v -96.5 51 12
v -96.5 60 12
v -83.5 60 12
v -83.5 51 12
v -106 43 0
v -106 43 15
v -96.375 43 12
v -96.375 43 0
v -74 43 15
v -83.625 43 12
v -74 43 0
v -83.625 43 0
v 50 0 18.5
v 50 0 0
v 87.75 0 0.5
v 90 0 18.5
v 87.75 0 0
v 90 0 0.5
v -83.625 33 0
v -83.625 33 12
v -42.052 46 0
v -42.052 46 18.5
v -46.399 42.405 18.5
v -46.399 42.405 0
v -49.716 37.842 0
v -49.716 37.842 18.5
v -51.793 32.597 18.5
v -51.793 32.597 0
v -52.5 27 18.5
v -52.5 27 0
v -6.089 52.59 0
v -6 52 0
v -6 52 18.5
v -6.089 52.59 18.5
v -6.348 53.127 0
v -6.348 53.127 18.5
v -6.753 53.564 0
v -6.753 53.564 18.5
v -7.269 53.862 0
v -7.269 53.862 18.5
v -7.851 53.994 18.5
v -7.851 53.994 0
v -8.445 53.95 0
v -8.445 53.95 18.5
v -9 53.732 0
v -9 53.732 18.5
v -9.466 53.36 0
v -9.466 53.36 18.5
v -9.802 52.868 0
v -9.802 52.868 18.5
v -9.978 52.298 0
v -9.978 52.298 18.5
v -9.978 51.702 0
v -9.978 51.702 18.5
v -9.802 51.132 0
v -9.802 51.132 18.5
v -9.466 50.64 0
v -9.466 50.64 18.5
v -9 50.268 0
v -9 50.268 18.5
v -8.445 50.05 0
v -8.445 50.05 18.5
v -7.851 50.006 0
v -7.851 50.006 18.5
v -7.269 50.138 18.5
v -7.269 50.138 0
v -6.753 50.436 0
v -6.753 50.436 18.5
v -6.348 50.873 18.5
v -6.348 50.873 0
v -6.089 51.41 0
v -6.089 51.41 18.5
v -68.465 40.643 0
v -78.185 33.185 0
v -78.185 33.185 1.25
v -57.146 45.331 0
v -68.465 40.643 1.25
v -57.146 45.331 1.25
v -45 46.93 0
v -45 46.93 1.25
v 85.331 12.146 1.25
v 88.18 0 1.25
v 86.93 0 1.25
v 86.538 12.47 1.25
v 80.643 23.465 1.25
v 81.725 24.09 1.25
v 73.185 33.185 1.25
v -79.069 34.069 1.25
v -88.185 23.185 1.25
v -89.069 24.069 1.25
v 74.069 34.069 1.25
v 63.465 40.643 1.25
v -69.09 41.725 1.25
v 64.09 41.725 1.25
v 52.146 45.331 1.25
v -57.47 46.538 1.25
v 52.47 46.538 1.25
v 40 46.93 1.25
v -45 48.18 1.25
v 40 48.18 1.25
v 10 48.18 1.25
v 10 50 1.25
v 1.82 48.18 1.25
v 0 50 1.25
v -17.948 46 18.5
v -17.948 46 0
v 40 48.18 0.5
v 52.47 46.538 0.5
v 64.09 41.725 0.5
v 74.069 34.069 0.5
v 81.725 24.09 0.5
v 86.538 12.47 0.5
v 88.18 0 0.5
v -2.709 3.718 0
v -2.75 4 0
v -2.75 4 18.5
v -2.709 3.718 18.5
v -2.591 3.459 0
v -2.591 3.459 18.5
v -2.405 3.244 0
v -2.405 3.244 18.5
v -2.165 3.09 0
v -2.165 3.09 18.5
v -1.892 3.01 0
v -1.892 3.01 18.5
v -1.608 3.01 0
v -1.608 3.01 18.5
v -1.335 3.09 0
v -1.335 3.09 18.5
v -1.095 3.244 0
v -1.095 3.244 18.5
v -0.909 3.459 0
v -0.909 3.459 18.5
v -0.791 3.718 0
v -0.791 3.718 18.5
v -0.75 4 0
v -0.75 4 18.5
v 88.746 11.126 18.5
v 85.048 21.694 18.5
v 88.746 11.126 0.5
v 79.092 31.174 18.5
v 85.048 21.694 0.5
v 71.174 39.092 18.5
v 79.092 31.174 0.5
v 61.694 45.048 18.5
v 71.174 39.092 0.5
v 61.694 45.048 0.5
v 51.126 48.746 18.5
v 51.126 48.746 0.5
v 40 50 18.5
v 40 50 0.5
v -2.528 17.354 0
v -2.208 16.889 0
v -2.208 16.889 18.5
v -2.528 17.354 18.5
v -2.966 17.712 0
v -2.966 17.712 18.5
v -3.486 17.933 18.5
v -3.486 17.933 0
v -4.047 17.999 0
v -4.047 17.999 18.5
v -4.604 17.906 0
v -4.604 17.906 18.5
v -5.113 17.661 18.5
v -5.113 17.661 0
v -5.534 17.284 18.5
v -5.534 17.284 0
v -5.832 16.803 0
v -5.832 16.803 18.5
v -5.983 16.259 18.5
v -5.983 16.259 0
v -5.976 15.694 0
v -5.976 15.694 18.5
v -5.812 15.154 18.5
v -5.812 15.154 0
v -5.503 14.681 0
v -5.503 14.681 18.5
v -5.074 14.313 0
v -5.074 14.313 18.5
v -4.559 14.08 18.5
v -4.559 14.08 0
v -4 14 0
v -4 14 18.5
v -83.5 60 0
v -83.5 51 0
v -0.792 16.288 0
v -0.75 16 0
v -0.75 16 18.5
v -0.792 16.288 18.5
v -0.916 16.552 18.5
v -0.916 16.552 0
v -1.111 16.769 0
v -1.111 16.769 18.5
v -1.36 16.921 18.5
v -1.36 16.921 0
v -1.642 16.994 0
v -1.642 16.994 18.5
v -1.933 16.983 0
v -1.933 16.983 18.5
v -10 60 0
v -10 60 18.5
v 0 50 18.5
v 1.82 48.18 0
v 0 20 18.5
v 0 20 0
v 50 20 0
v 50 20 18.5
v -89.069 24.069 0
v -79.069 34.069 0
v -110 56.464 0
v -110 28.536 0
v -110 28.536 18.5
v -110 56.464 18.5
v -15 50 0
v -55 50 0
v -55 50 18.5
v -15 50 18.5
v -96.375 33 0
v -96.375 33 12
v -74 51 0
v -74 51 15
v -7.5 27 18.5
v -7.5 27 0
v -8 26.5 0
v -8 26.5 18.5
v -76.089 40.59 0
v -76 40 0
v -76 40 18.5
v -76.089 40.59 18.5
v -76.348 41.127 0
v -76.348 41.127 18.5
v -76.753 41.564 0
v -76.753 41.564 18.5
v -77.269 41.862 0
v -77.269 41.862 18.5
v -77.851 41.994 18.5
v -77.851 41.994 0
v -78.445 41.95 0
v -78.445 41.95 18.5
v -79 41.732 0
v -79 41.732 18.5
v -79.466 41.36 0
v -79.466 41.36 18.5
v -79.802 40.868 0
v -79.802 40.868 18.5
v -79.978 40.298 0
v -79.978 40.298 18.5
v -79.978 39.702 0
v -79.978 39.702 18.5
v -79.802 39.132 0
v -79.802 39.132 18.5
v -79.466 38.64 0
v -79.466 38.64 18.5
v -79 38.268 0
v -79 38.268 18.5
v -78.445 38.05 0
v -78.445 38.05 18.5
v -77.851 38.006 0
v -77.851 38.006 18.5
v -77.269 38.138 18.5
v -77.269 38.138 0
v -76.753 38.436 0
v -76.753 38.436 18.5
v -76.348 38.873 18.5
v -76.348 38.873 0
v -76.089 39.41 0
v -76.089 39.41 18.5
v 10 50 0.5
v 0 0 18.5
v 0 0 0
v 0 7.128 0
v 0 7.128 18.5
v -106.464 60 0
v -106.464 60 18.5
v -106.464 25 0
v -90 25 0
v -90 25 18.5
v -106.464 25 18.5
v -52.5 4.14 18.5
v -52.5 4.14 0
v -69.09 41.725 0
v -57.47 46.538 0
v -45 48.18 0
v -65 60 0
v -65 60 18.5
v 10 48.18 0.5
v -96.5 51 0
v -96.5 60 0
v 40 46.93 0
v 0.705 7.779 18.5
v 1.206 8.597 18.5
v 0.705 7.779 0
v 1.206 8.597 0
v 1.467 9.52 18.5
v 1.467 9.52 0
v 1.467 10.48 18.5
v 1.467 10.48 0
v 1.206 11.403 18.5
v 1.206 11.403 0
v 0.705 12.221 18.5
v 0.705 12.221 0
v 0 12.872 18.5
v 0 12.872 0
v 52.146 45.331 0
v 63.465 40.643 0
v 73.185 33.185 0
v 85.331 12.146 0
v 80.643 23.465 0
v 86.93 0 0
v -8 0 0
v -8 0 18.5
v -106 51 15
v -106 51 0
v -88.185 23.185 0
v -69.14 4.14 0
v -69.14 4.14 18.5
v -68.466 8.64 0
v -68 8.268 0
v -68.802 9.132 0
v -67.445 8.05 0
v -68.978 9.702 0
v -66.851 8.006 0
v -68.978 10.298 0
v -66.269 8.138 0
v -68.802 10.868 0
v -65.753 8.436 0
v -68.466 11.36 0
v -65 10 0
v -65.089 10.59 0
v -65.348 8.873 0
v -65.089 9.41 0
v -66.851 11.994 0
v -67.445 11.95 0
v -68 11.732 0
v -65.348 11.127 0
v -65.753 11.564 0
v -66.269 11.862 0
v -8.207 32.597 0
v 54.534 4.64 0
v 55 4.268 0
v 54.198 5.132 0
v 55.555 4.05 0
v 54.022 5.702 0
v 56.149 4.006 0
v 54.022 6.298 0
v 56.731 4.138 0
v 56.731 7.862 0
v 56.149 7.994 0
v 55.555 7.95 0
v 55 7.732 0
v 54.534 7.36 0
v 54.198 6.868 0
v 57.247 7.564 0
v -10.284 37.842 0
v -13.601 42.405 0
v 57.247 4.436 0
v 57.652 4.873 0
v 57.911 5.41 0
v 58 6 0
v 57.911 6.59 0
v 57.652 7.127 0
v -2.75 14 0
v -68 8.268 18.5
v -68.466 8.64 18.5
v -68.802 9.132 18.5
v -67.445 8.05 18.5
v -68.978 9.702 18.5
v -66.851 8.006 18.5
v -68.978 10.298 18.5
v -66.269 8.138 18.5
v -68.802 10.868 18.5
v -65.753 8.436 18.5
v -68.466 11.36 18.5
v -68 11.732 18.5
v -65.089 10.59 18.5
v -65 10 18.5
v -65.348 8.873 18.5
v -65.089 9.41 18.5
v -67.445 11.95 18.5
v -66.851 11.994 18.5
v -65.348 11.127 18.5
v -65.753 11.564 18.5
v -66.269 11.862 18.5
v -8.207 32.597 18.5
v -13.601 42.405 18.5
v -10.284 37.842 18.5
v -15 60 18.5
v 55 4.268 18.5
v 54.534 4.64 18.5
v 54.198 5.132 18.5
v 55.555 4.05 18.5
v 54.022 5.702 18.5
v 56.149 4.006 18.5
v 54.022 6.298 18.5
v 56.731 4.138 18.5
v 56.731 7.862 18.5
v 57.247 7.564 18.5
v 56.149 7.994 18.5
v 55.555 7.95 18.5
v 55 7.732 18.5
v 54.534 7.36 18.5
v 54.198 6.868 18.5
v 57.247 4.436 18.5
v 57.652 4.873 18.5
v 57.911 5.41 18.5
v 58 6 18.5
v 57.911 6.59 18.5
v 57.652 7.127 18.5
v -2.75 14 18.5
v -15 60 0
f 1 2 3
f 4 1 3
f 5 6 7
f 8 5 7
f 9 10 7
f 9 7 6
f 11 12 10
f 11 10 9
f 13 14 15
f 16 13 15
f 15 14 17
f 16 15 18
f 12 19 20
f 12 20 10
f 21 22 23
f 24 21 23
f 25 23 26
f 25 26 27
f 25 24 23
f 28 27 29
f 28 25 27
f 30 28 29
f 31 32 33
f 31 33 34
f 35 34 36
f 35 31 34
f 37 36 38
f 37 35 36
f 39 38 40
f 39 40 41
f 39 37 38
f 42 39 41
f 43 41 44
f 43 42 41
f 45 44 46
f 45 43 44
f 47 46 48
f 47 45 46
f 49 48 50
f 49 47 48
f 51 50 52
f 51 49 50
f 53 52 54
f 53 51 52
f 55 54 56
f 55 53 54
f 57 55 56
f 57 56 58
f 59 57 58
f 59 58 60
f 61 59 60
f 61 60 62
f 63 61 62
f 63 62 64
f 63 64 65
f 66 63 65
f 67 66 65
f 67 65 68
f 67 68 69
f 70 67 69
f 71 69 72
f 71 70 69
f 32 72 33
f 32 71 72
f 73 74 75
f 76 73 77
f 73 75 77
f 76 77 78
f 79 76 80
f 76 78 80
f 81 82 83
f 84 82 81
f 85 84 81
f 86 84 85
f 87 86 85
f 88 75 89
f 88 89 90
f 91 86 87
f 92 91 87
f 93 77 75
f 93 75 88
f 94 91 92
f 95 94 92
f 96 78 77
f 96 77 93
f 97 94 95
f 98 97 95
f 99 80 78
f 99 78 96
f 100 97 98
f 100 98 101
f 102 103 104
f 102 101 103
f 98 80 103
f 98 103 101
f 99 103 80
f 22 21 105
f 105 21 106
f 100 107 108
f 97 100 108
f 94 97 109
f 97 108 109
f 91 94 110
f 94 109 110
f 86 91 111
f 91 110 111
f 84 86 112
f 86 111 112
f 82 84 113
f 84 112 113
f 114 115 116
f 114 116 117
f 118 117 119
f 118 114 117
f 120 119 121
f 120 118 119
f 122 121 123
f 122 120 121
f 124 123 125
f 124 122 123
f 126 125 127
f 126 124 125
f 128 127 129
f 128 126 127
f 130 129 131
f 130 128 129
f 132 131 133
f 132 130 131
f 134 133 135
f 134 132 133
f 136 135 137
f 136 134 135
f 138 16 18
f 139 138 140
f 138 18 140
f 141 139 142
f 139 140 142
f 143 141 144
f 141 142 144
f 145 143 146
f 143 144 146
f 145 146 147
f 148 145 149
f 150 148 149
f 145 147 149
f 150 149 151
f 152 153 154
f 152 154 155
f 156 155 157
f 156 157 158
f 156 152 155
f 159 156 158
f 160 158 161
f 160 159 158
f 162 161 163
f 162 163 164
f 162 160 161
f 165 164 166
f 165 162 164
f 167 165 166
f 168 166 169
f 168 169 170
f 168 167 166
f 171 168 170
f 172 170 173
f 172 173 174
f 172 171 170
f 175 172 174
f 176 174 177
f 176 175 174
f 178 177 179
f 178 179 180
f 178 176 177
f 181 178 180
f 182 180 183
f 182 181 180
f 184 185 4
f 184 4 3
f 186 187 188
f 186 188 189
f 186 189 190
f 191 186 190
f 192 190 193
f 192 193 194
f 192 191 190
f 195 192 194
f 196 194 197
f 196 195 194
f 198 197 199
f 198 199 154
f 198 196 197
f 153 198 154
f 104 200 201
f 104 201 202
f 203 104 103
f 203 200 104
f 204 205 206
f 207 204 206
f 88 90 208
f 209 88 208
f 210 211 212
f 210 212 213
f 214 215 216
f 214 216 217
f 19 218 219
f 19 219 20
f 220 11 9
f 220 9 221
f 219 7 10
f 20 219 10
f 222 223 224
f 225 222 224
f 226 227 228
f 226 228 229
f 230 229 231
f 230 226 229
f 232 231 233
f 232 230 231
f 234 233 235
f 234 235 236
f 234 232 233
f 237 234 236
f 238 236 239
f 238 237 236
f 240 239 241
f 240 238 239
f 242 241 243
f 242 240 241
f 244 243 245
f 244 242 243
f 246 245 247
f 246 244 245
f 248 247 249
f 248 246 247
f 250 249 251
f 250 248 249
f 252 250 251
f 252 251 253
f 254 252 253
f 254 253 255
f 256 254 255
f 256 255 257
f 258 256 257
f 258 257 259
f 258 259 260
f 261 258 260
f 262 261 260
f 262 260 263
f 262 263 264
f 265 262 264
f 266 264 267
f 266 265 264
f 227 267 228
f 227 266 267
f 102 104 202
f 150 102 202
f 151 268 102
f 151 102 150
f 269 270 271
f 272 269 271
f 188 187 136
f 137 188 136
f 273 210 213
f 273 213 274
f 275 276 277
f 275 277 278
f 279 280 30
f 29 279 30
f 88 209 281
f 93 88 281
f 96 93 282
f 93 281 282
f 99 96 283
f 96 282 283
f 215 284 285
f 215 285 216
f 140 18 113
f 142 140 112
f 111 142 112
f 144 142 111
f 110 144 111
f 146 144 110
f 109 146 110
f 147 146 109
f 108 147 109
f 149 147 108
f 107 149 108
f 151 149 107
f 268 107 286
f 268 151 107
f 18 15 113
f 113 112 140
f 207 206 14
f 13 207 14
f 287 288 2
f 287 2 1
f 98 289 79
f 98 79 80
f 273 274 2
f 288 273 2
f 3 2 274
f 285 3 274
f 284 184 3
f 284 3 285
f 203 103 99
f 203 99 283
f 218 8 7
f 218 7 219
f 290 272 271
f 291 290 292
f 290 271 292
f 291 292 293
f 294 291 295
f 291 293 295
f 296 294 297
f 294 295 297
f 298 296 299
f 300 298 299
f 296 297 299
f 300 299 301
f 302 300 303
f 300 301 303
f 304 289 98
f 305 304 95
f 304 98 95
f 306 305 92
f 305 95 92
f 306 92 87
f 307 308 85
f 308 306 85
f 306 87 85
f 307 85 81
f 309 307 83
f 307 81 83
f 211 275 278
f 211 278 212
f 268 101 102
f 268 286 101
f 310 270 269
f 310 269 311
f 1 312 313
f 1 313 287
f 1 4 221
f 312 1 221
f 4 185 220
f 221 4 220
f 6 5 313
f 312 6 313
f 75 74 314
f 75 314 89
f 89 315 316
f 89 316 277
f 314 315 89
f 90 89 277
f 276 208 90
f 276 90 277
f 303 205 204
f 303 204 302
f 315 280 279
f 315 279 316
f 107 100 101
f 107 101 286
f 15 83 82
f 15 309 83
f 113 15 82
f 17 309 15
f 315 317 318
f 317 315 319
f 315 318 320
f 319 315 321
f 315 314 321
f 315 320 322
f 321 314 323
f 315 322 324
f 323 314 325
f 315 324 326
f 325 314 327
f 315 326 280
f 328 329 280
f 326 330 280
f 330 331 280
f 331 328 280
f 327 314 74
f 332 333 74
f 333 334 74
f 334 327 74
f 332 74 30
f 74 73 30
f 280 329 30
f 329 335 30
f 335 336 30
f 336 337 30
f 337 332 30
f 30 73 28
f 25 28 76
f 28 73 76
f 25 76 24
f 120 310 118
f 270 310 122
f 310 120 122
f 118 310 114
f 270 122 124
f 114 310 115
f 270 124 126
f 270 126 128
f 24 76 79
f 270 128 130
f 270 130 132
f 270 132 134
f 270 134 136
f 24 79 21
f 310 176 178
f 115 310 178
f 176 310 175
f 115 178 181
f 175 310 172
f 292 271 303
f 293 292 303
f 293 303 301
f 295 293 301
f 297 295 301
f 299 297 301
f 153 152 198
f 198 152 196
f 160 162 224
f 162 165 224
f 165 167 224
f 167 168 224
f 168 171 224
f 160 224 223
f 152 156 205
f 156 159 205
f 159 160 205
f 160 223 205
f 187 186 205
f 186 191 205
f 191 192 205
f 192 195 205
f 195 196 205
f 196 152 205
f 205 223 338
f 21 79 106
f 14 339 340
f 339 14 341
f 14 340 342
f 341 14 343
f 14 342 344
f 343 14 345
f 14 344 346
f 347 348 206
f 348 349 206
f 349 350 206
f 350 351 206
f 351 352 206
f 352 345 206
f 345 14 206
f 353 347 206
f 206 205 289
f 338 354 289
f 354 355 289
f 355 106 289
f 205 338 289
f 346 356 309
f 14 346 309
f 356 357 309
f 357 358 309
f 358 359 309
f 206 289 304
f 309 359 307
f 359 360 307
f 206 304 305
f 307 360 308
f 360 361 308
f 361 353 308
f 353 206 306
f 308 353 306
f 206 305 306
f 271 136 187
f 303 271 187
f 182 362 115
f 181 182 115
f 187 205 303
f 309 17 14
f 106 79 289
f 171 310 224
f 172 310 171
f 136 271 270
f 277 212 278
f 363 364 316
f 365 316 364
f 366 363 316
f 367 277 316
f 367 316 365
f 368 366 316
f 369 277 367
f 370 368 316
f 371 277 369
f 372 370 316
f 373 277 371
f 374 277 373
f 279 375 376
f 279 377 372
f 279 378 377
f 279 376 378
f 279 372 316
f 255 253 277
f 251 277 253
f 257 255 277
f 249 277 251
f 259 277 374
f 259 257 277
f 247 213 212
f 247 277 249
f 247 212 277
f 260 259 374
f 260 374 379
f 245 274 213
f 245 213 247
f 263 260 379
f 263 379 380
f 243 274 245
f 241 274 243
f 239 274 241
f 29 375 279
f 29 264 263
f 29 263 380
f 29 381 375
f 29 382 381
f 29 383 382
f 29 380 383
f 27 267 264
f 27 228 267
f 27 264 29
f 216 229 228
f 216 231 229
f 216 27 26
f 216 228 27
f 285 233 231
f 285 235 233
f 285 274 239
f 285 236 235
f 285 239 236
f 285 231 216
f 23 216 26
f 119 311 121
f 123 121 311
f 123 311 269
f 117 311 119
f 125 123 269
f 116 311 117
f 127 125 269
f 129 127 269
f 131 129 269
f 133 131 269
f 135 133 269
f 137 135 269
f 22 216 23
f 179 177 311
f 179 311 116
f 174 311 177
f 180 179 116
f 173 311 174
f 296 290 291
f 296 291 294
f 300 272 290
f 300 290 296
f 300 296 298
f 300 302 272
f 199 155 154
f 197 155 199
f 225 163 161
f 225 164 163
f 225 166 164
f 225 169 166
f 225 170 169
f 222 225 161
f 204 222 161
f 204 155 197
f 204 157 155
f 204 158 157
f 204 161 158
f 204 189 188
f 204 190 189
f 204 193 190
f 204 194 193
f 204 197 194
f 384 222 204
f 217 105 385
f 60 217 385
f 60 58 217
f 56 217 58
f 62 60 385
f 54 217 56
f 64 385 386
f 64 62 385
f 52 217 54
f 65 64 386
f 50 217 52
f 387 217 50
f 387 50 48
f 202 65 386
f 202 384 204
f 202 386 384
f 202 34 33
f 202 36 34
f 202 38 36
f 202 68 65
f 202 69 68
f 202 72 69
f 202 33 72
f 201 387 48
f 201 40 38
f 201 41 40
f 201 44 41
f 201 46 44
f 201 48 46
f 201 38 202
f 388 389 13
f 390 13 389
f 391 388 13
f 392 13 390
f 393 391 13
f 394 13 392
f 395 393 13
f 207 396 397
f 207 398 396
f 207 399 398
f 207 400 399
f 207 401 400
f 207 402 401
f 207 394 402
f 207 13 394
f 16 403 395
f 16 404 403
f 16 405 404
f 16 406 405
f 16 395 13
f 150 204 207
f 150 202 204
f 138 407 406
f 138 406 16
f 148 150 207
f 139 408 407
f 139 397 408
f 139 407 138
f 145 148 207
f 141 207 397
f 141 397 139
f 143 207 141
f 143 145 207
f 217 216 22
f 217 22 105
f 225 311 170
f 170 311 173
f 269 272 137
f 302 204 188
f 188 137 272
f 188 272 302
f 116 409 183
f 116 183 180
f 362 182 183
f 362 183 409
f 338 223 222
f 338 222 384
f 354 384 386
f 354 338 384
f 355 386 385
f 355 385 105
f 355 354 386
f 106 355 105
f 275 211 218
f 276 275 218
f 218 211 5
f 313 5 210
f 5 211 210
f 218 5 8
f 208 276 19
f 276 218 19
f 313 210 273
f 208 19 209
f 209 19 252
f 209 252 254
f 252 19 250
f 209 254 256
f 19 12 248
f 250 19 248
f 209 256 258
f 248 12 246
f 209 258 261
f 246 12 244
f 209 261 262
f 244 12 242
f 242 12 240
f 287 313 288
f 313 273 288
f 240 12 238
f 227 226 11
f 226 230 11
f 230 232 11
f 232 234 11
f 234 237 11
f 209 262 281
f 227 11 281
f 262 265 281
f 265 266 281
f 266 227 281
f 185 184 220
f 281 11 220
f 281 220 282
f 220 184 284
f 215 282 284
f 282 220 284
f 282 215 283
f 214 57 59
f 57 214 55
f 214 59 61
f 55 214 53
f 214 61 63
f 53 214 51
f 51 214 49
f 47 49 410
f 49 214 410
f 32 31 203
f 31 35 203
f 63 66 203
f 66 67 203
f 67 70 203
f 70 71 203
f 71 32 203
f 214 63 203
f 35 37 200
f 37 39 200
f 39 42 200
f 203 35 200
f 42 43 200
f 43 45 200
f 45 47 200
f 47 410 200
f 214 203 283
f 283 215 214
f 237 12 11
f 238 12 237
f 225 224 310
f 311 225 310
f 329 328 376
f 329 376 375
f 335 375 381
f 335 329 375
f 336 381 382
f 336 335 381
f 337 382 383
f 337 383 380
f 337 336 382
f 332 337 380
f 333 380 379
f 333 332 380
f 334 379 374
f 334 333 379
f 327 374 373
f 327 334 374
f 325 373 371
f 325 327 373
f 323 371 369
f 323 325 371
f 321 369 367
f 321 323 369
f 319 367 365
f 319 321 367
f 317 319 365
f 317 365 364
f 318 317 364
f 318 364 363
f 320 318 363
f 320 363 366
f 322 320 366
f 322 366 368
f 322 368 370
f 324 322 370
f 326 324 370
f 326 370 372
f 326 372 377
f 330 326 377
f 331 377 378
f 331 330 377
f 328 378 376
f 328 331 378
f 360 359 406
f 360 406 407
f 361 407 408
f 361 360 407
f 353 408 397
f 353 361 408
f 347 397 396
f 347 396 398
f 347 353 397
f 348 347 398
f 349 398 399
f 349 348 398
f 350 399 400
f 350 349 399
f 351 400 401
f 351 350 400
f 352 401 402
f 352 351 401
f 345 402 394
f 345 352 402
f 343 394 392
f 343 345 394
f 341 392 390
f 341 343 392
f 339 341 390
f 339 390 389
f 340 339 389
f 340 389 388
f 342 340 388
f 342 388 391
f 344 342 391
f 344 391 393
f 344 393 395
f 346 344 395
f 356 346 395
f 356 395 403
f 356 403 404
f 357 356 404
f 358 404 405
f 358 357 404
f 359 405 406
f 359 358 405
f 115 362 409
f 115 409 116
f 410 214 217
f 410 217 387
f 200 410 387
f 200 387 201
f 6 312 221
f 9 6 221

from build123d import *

# Parameters (mm, degrees)
SKETCH_R        = 2
PAD_DEPTH       = 18.5
POCKET_DEPTH    = 1.25
POCKET001_DEPTH = 12
SKETCH005_W     = 32
SKETCH005_H     = 8
POCKET002_DEPTH = 15
POCKET003_DEPTH = 0.5


with BuildPart() as part:
    # Sketch → Pad (new body)
    with BuildSketch(Plane.XY):
        with BuildLine():
            Line((0, 20), (50, 20))
            Line((50, 20), (50, 0))
            Line((50, 0), (90, 0))
            ThreePointArc((90, 0), (75.3553391883, 35.3553389303), (40.0000003648, 50))
            Line((0, 50), (40.0000003648, 50))
            Line((-10, 60), (0, 50))
            Line((-15, 60), (-10, 60))
            Line((-15, 50), (-15, 60))
            Line((-55, 50), (-15, 50))
            Line((-65, 60), (-55, 50))
            Line((-106.4644660941, 60), (-65, 60))
            Line((-110, 56.4644660941), (-106.4644660941, 60))
            Line((-110, 28.5355339059), (-110, 56.4644660941))
            Line((-106.4644660941, 25), (-110, 28.5355339059))
            Line((-90, 25), (-106.4644660941, 25))
            Line((-69.14, 4.14), (-90, 25))
            Line((-52.5, 4.14), (-69.14, 4.14))
            Line((-52.5, 4.14), (-52.5, 27.0000073596))
            ThreePointArc((-42.0519707932, 46), (-49.7157196548, 37.8416049777), (-52.5, 27.0000073596))
            Line((-42.0519707932, 46), (-17.9480292068, 46))
            ThreePointArc((-7.5, 27), (-10.2842785721, 37.8416017533), (-17.9480292068, 46))
            Line((-7.5, 27), (-8, 26.5))
            Line((-8, 26.5), (-8, 0))
            Line((0, 0), (-8, 0))
            Line((0, 0), (0, 7.1277186767))
            ThreePointArc((0, 7.1277186767), (1.5, 10), (0, 12.8722813233))
            Line((0, 20), (0, 12.8722813233))
        make_face()
        with Locations((56, 6)):
            Circle(SKETCH_R, mode=Mode.SUBTRACT)
        with Locations((-8, 52)):
            Circle(SKETCH_R, mode=Mode.SUBTRACT)
        with Locations((-67, 10)):
            Circle(SKETCH_R, mode=Mode.SUBTRACT)
        with Locations((-78, 40)):
            Circle(SKETCH_R, mode=Mode.SUBTRACT)
        with BuildLine():
            ThreePointArc((-2.2083333333, 16.8887803753), (-5.6996412833, 17.0541439694), (-3.9999998699, 14))
            Line((-3.9999998699, 14), (-2.75, 14))
            Line((-2.75, 14), (-2.75, 4))
            ThreePointArc((-2.75, 4), (-1.75, 3), (-0.75, 4))
            Line((-0.75, 16), (-0.75, 4))
            ThreePointArc((-0.75, 16), (-1.2295835001, 16.8539125638), (-2.2083333333, 16.8887803753))
        make_face(mode=Mode.SUBTRACT)
    extrude(amount=PAD_DEPTH)

    # SubtractivePipe: sweep along a path in Sketch001
    with BuildLine(Plane.XY.offset(18.5)) as subtractivepipe_path:
        Line((-72.9307178569, 0), (-58.9653554732, 13.9653623837))
        ThreePointArc((-58.9653554732, 13.9653623837), (-52.5579955482, 18.2466216954), (-45.0000000351, 19.75))
        Line((-45.0000000351, 19.75), (39.9999998281, 19.75))
        ThreePointArc((39.9999998281, 19.75), (53.9653588677, 13.9653589892), (59.75, 0))
    # Sketch002 (on DatumPlane) → SubtractivePipe (sweep, cut)
    with BuildSketch(Plane(origin=(-32.5, -32.5, 0), x_dir=(0.7071067812, -0.7071067812, 0), z_dir=(-0.7071067812, -0.7071067812, 0))):
        Polygon((-80, -18.75), (-70, -18.75), (-70, -0.25), (-78.75, -0.25), (-78.75, 1.25), (-80, 1.25), align=None)
    sweep(path=subtractivepipe_path.line, mode=Mode.SUBTRACT)

    # Sketch003 → Pocket (cut)
    with BuildSketch(Plane.XY):
        Polygon((0, 50), (2, 48), (10, 48), (10, 50), align=None)
    extrude(amount=POCKET_DEPTH, mode=Mode.SUBTRACT)

    # Sketch004 → Pocket001 (cut)
    with BuildSketch(Plane.XY):
        Polygon((-96.5, 60), (-96.5, 50.5), (-96.375, 50.5), (-96.375, 33), (-83.625, 33), (-83.625, 50.5), (-83.5, 50.5), (-83.5, 60), align=None)
    extrude(amount=POCKET001_DEPTH, mode=Mode.SUBTRACT)

    # Sketch005 → Pocket002 (cut)
    with BuildSketch(Plane.XY):
        with Locations((-90, 47)):
            Rectangle(SKETCH005_W, SKETCH005_H)
    extrude(amount=POCKET002_DEPTH, mode=Mode.SUBTRACT)

    # Sketch006 → Pocket003 (cut)
    with BuildSketch(Plane.XY):
        with BuildLine():
            ThreePointArc((87.7395276474, -1), (74.1160702602, 33.4089247058), (40, 47.75))
            Line((40, 47.75), (9.5, 47.75))
            Line((9.5, 47.75), (9.5, 50.25))
            Line((9.5, 50.25), (39.9999271709, 50.25))
            ThreePointArc((90.2400487659, -1), (75.8839019692, 35.1768116729), (39.9999271709, 50.2499999999))
            Line((87.7395276474, -1), (90.2400487659, -1))
        make_face()
    extrude(amount=POCKET003_DEPTH, mode=Mode.SUBTRACT)


solid = part.part
